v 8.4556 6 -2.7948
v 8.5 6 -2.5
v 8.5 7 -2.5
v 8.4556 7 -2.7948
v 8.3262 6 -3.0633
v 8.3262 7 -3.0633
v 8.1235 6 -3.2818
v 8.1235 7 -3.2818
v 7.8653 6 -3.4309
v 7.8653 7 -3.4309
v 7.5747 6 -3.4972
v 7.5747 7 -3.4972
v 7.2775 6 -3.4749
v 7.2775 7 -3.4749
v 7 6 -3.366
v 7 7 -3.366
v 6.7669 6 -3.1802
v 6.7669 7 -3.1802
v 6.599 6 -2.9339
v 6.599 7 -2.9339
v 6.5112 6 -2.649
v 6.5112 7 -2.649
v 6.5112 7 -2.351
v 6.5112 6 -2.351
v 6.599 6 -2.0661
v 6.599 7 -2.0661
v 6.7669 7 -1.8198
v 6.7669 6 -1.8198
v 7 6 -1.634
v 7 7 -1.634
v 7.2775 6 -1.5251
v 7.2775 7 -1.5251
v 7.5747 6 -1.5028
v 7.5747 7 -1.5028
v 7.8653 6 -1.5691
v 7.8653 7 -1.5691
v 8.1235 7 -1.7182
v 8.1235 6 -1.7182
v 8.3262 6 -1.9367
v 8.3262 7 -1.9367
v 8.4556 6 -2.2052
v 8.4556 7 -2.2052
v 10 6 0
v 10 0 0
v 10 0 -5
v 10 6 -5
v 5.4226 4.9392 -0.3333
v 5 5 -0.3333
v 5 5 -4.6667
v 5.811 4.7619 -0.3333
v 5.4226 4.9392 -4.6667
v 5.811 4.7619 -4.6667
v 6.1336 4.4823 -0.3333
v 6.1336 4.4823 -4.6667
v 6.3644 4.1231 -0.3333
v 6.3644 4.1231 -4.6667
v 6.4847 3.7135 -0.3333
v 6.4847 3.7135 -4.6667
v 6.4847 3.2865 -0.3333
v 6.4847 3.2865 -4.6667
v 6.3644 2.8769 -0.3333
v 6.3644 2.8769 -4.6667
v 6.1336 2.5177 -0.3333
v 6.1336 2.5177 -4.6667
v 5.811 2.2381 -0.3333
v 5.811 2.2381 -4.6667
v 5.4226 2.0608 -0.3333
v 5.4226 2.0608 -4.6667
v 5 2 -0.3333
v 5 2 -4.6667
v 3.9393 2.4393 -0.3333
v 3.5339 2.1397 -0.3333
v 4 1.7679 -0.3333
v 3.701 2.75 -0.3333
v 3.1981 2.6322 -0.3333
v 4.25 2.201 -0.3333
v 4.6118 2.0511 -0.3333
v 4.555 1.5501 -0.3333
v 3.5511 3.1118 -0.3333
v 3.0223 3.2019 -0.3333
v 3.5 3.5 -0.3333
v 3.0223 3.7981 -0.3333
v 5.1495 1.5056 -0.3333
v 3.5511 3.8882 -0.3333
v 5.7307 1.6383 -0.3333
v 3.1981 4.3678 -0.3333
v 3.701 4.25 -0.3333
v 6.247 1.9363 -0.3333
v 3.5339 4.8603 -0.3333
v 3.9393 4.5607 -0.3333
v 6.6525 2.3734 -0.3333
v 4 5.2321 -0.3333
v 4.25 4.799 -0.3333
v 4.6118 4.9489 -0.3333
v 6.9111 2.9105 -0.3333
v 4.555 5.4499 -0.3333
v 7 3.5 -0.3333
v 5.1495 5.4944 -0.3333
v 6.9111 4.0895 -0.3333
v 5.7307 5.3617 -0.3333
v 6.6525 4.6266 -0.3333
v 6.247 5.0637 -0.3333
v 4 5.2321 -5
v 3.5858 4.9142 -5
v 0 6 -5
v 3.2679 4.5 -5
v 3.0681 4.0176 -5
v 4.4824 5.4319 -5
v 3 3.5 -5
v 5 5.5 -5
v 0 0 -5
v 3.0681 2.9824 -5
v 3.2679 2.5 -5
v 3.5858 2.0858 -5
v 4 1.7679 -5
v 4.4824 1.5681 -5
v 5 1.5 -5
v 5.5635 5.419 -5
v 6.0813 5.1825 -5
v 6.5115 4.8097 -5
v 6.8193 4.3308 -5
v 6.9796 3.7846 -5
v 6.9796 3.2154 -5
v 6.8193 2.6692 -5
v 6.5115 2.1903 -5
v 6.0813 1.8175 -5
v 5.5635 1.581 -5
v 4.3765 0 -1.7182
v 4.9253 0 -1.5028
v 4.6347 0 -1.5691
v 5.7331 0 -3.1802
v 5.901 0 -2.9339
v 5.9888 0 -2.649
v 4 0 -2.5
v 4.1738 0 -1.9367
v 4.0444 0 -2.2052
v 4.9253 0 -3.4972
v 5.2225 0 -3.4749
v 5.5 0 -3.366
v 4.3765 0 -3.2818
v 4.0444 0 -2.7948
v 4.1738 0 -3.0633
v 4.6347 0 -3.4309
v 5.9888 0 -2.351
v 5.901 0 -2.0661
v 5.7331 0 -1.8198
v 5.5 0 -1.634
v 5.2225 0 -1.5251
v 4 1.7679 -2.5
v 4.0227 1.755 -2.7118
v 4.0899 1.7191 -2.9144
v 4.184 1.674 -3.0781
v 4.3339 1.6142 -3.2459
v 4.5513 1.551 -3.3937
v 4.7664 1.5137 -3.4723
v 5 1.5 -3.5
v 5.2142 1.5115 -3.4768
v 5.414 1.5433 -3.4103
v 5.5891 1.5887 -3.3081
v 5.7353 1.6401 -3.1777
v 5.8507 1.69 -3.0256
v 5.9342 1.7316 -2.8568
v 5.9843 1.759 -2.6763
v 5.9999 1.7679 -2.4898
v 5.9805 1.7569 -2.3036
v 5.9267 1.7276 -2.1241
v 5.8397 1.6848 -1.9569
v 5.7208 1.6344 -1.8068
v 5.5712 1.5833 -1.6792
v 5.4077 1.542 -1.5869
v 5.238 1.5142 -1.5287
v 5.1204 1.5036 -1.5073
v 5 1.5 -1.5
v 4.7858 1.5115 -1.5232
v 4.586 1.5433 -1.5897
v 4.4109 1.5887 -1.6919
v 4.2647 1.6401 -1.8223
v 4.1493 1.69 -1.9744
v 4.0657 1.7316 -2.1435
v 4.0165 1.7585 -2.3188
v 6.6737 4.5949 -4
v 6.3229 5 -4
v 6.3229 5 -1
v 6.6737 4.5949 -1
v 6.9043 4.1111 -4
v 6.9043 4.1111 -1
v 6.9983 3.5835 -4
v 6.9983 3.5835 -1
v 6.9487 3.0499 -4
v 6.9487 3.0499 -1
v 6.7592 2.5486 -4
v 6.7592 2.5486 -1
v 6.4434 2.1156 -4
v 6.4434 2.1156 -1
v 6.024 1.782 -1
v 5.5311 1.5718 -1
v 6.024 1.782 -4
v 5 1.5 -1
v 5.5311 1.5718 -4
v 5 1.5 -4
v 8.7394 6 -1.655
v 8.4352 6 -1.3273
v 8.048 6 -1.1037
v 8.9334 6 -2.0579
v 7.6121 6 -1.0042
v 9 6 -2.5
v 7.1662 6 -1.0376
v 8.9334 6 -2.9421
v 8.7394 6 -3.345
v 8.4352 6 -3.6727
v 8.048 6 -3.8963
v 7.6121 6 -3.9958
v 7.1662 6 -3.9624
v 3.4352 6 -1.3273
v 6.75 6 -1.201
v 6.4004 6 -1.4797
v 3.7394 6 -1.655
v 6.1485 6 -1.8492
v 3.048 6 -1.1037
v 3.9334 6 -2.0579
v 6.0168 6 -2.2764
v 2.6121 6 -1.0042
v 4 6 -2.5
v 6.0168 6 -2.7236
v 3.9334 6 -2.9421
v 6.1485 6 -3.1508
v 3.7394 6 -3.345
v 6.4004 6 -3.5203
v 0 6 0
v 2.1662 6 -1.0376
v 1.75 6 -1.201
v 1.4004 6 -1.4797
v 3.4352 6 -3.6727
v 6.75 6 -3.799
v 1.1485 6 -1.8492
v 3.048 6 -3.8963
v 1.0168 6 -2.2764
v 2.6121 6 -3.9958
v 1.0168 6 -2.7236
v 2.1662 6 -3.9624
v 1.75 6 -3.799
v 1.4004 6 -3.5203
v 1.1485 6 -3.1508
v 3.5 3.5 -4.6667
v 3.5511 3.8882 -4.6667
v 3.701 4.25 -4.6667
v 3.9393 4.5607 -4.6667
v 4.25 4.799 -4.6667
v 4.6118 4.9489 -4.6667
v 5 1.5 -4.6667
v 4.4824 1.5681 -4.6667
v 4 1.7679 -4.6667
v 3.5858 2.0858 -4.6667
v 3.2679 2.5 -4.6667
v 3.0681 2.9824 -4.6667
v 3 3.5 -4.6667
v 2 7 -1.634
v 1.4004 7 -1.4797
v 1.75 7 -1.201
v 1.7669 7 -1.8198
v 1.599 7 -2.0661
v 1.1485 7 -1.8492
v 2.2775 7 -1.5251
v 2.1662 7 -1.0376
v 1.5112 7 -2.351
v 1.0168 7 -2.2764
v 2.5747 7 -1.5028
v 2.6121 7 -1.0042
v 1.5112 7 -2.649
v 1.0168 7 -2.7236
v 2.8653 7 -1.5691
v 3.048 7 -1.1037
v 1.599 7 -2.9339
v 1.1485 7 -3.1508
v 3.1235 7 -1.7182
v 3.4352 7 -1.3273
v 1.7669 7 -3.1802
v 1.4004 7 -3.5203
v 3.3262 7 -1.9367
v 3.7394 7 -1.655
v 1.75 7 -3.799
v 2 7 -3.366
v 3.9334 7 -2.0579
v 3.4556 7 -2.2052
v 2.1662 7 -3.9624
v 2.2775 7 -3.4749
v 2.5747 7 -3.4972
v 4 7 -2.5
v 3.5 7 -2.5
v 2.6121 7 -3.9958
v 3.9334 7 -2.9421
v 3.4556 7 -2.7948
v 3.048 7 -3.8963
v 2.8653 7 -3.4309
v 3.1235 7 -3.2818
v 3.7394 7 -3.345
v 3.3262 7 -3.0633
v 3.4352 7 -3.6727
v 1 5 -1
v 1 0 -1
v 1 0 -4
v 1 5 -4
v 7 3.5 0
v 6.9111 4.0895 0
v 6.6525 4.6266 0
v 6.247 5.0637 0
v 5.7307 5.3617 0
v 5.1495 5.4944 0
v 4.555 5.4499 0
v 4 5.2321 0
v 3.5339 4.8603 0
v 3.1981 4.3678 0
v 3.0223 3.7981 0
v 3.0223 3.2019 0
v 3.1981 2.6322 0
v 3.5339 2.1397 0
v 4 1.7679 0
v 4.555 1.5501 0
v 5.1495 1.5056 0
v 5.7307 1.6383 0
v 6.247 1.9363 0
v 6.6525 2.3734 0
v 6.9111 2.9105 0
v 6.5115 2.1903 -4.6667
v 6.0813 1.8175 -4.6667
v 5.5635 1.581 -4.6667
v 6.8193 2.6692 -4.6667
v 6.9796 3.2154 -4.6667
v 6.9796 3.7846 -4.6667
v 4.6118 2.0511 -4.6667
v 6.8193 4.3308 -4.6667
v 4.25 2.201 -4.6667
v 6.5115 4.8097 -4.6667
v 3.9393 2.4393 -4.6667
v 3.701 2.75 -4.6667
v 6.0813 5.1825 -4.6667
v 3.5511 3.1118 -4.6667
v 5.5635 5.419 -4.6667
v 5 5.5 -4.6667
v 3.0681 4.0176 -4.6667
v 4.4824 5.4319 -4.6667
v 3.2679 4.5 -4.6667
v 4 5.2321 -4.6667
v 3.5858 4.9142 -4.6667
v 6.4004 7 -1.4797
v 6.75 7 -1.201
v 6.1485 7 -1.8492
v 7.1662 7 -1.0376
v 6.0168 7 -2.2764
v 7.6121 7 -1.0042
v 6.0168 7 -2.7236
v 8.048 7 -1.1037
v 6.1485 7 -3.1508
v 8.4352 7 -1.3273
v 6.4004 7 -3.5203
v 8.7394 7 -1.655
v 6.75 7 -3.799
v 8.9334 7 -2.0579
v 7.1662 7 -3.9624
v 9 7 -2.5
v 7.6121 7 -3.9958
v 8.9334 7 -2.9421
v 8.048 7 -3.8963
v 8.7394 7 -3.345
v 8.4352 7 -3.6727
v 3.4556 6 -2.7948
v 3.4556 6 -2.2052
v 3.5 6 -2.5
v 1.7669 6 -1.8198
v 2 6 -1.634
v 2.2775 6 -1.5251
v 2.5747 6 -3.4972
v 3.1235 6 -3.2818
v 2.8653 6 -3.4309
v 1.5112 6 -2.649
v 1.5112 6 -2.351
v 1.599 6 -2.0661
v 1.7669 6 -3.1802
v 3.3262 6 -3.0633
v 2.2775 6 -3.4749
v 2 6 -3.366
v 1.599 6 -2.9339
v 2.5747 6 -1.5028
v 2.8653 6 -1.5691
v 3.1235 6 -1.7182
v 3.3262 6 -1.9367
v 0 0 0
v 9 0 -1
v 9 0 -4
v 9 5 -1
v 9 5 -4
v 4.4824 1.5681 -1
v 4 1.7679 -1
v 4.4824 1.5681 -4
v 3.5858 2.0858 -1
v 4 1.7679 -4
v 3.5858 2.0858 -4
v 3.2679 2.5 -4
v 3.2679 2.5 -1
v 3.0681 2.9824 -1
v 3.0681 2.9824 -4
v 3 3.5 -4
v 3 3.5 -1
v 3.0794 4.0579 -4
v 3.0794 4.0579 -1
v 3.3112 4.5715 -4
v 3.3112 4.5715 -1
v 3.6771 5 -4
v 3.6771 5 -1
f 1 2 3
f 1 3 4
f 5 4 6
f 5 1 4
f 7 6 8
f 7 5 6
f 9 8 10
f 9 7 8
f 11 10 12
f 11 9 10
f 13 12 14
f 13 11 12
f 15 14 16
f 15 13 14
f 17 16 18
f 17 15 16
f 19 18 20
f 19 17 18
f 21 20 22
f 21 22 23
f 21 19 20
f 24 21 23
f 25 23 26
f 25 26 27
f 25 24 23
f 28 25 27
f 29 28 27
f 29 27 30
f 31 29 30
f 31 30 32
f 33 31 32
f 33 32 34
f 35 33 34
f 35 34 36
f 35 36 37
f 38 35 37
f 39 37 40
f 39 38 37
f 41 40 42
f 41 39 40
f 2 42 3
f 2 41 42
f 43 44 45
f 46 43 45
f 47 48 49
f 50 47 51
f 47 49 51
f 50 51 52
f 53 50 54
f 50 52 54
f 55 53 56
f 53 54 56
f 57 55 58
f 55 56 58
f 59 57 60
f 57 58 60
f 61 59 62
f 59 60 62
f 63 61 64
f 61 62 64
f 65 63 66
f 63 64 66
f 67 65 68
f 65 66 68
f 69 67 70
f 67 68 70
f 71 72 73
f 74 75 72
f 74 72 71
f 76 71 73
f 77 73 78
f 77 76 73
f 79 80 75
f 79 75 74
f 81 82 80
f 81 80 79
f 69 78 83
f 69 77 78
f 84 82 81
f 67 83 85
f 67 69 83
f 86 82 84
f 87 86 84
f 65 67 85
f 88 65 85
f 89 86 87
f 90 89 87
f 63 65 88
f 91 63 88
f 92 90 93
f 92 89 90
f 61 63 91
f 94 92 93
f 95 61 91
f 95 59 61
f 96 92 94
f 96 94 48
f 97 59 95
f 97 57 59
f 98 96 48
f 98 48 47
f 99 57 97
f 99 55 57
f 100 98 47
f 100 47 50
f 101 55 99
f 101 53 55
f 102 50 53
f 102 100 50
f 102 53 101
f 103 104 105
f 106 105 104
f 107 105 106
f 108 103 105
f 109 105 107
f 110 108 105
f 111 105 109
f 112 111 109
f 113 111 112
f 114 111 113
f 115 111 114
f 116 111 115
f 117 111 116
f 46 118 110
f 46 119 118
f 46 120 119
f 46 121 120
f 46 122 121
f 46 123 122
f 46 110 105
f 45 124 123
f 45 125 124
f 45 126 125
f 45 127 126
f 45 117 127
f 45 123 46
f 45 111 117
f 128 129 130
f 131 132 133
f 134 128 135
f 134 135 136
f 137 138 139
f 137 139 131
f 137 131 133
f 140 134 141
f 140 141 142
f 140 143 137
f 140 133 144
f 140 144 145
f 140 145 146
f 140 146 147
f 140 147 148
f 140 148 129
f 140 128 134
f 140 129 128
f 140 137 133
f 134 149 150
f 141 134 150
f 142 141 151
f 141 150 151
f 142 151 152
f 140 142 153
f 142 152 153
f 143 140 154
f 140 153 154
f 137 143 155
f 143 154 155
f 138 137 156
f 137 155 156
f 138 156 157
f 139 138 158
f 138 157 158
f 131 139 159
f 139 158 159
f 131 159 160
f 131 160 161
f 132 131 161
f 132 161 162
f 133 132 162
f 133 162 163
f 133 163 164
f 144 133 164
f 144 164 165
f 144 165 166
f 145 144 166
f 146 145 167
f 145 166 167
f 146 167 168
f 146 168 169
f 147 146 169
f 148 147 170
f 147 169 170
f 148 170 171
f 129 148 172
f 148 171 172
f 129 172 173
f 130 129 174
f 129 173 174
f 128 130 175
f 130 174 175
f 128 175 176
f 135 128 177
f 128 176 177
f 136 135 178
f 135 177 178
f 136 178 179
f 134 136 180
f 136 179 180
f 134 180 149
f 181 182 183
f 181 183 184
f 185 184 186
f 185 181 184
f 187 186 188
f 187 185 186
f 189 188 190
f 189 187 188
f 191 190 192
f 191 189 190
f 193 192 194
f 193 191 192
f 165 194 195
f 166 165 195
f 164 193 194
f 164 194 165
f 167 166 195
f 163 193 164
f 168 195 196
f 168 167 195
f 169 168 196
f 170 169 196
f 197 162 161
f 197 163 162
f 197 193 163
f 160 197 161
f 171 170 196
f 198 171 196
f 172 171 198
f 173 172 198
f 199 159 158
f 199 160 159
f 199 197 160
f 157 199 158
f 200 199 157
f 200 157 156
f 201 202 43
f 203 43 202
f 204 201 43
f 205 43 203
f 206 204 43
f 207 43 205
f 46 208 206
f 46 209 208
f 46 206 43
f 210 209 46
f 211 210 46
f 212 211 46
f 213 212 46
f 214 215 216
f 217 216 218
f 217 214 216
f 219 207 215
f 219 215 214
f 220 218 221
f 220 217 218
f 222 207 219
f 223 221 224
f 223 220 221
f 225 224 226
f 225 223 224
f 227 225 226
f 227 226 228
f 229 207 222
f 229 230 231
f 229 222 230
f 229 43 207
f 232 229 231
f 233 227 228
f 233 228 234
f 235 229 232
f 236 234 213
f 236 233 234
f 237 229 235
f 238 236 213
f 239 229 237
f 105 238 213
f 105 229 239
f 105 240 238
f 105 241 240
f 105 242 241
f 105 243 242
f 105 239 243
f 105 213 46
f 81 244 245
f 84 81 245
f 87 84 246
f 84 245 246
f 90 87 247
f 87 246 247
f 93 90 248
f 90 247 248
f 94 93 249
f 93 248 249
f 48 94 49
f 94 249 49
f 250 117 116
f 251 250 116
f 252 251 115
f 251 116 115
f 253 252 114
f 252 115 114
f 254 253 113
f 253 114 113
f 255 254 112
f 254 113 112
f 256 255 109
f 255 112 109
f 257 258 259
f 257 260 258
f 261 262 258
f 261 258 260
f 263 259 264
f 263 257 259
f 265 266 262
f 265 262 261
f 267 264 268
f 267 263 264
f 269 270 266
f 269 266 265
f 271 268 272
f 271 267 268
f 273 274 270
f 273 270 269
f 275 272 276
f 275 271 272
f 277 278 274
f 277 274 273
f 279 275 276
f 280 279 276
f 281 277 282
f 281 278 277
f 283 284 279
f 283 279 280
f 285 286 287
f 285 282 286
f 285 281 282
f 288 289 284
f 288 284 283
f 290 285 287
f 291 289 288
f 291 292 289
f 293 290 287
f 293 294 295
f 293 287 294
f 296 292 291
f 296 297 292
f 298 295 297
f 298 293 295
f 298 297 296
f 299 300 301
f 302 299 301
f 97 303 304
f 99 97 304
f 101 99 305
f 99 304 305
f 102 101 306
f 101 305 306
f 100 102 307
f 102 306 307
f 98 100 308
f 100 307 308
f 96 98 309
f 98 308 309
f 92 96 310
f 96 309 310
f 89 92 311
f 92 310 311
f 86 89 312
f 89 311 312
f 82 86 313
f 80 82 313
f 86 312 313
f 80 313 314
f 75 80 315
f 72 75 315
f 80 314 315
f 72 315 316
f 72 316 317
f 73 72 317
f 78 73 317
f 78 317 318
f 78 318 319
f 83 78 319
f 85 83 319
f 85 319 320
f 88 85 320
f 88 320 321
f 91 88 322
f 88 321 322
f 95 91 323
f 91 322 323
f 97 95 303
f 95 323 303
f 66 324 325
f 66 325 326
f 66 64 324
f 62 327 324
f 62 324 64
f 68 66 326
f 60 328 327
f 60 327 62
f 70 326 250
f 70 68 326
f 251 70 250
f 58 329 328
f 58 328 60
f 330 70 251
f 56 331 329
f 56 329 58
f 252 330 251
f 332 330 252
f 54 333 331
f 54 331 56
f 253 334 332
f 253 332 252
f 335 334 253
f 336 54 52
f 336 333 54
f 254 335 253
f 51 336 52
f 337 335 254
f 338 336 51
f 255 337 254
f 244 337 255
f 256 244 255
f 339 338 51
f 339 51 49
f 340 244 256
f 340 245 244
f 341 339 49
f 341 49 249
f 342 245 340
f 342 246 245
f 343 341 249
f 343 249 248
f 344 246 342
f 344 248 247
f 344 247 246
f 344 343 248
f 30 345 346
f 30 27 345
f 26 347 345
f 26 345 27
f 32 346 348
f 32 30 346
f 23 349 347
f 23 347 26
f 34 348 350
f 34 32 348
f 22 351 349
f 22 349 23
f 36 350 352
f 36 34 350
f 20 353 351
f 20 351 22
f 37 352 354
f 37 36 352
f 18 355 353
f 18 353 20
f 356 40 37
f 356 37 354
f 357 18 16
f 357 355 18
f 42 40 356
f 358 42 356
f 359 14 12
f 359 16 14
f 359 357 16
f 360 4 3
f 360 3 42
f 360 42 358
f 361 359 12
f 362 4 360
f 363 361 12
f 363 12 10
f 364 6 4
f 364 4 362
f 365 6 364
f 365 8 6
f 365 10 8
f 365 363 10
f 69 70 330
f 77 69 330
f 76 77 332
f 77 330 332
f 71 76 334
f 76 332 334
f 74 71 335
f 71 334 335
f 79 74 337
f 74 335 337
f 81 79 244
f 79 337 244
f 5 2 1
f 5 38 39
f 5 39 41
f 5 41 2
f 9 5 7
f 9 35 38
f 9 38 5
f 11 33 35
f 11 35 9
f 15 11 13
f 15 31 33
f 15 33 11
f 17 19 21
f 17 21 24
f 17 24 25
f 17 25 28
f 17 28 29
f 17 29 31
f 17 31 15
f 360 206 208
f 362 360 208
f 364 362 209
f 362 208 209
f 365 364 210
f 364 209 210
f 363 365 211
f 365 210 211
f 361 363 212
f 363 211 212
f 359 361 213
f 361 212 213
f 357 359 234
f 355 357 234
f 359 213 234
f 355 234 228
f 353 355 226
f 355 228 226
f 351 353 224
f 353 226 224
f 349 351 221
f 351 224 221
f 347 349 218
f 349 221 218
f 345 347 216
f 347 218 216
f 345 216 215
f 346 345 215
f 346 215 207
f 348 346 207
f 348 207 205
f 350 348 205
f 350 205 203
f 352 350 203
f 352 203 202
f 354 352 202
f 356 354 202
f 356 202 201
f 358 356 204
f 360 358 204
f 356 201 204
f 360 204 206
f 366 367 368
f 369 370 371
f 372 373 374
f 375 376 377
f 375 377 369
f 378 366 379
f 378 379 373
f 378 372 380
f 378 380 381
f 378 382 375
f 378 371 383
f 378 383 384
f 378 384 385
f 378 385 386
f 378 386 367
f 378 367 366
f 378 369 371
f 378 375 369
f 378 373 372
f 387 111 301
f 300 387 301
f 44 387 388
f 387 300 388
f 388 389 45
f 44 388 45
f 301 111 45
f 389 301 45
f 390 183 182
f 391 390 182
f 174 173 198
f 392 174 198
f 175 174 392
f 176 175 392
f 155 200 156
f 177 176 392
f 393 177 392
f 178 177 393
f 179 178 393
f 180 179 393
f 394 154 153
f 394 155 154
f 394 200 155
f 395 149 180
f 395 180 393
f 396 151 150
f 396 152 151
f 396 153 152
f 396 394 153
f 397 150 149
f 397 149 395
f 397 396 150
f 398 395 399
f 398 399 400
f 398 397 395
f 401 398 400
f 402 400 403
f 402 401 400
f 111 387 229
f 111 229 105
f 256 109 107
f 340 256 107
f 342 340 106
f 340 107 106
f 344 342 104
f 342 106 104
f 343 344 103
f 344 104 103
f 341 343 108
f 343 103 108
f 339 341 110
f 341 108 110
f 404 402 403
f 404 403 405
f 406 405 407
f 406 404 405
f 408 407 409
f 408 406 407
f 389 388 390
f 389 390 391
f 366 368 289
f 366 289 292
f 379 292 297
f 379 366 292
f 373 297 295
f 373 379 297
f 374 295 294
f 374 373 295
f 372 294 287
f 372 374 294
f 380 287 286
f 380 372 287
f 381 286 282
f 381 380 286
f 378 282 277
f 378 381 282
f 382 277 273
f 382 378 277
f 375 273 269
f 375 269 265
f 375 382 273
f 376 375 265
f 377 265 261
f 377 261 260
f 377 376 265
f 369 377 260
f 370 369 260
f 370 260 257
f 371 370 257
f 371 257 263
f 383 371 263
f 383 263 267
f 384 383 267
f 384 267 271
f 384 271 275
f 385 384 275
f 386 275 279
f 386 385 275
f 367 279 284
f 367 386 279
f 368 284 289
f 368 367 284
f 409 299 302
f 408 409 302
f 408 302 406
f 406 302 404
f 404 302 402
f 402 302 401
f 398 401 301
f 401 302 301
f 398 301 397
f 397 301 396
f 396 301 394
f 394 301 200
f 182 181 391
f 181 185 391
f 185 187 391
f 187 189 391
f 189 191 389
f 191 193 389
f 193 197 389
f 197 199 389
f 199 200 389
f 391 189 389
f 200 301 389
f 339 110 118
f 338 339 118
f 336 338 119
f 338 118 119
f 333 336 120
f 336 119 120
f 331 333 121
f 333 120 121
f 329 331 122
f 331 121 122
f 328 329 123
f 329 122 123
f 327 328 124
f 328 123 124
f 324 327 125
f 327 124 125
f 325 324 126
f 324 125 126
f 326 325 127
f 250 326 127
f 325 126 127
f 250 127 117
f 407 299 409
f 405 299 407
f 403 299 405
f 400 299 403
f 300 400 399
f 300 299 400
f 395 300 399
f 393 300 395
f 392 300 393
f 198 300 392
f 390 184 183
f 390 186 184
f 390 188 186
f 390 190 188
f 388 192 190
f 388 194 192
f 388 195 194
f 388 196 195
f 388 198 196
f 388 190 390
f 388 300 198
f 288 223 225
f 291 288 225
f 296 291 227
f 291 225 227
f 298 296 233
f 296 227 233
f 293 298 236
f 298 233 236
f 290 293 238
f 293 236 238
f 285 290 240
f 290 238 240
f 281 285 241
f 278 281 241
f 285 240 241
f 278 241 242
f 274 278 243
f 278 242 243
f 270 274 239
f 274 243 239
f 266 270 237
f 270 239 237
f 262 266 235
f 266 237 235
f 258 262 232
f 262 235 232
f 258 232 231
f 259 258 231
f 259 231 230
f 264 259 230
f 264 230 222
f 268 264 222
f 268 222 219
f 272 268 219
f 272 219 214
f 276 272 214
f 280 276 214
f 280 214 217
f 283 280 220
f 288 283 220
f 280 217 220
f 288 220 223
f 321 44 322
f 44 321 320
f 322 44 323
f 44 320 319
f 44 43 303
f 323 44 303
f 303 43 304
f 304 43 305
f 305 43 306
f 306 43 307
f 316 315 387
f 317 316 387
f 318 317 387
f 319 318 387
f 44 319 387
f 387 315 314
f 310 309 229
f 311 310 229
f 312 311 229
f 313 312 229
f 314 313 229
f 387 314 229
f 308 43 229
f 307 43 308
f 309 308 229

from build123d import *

# Parameters (mm, degrees)
SKETCH1_W           = 10
SKETCH1_H           = 5
SKETCH1_W_2         = 8
SKETCH1_H_2         = 3
BOSS_EXTRUDE1_DEPTH = 6
BOSS_EXTRUDE2_REACH = 11
SKETCH2_W           = 3
SKETCH2_H           = 1
SKETCH4_R           = 1.5
SKETCH4_R_2         = 1
BOSS_EXTRUDE3_DEPTH = 1
BOSS_EXTRUDE4_DEPTH = 5
BOSS_EXTRUDE5_DEPTH = 5
CUT_EXTRUDE2_DEPTH  = 5
CUT_EXTRUDE3_DEPTH  = 0.333333333
SKETCH8_R           = 2
CUT_EXTRUDE4_DEPTH  = 0.333333333


with BuildPart() as part:
    # Sketch1 → Boss-Extrude1 (new body)
    with BuildSketch(Plane(origin=(0, 0, 0), x_dir=(1, 0, 0), z_dir=(0, 1, 0))):
        with Locations((5, 2.5)):
            Rectangle(SKETCH1_W, SKETCH1_H)
        with Locations((5, 2.5)):
            Rectangle(SKETCH1_W_2, SKETCH1_H_2, mode=Mode.SUBTRACT)
    extrude(amount=BOSS_EXTRUDE1_DEPTH)

    # Sketch2 → Boss-Extrude2 (add, up to next)
    with BuildSketch(Plane(origin=(1, 0, 0), x_dir=(0, 0, -1), z_dir=(1, 0, 0)), mode=Mode.PRIVATE) as boss_extrude2_sk1:
        with Locations((2.5, 5.5)):
            Rectangle(SKETCH2_W, SKETCH2_H)
    boss_extrude2_tool1 = extrude(boss_extrude2_sk1.sketch, amount=BOSS_EXTRUDE2_REACH, mode=Mode.PRIVATE) - part.part
    add(boss_extrude2_tool1.solids().sort_by_distance((1, 5.5, -2.5))[0])

    # Sketch4 → Boss-Extrude3 (add)
    with BuildSketch(Plane(origin=(0, 6, 0), x_dir=(1, 0, 0), z_dir=(0, 1, 0))):
        with Locations((2.5, 2.5)):
            Circle(SKETCH4_R)
        with Locations((2.5, 2.5)):
            Circle(SKETCH4_R_2, mode=Mode.SUBTRACT)
        with Locations((7.5, 2.5)):
            Circle(SKETCH4_R)
        with Locations((7.5, 2.5)):
            Circle(SKETCH4_R_2, mode=Mode.SUBTRACT)
    extrude(amount=BOSS_EXTRUDE3_DEPTH)

    # Sketch6 → Boss-Extrude4 (add)
    with BuildSketch(Plane(origin=(0, 5, 0), x_dir=(-1, 0, 0), z_dir=(0, -1, 0))):
        with BuildLine():
            ThreePointArc((-6, 2.5), (-5, 1.5), (-4, 2.5))
            Line((-4, 2.5), (-6, 2.5))
        make_face()
        with BuildLine():
            Line((-6, 2.5), (-4, 2.5))
            ThreePointArc((-4, 2.5), (-5, 3.5), (-6, 2.5))
        make_face()
    extrude(amount=BOSS_EXTRUDE4_DEPTH)

    # Sketch7 → Boss-Extrude5 (add)
    with BuildSketch(Plane(origin=(0, 0, -5), x_dir=(-1, 0, 0), z_dir=(0, 0, -1))):
        with BuildLine():
            ThreePointArc((-5, 5.5), (-7, 3.5), (-5, 1.5))
            Line((-5, 1.5), (-5, 2))
            ThreePointArc((-5, 2), (-6.5, 3.5), (-5, 5))
            Line((-5, 5), (-5, 5.5))
        make_face()
        with BuildLine():
            Line((-5, 2), (-5, 1.5))
            ThreePointArc((-5, 1.5), (-3.585786438, 2.085786438), (-3, 3.5))
            ThreePointArc((-3, 3.5), (-3.585786438, 4.914213562), (-5, 5.5))
            Line((-5, 5.5), (-5, 5))
            ThreePointArc((-5, 5), (-3.939339828, 4.560660172), (-3.5, 3.5))
            ThreePointArc((-3.5, 3.5), (-3.939339828, 2.439339828), (-5, 2))
        make_face()
        with BuildLine():
            ThreePointArc((-5, 5), (-6.5, 3.5), (-5, 2))
            Line((-5, 2), (-5, 5))
        make_face()
        with BuildLine():
            Line((-5, 5), (-5, 2))
            ThreePointArc((-5, 2), (-3.939339828, 2.439339828), (-3.5, 3.5))
            ThreePointArc((-3.5, 3.5), (-3.939339828, 4.560660172), (-5, 5))
        make_face()
    extrude(amount=-BOSS_EXTRUDE5_DEPTH)

    # Sketch7<3> → Cut-Extrude2 (cut)
    with BuildSketch(Plane(origin=(0, 0, -5), x_dir=(-1, 0, 0), z_dir=(0, 0, -1))):
        with BuildLine():
            ThreePointArc((-5, 5), (-6.5, 3.5), (-5, 2))
            Line((-5, 2), (-5, 5))
        make_face()
        with BuildLine():
            Line((-5, 5), (-5, 2))
            ThreePointArc((-5, 2), (-3.939339828, 2.439339828), (-3.5, 3.5))
            ThreePointArc((-3.5, 3.5), (-3.939339828, 4.560660172), (-5, 5))
        make_face()
    extrude(amount=-CUT_EXTRUDE2_DEPTH, mode=Mode.SUBTRACT)

    # Sketch7<4> → Cut-Extrude3 (cut)
    with BuildSketch(Plane(origin=(0, 0, -5), x_dir=(-1, 0, 0), z_dir=(0, 0, -1))):
        with BuildLine():
            ThreePointArc((-5, 5.5), (-7, 3.5), (-5, 1.5))
            Line((-5, 1.5), (-5, 2))
            ThreePointArc((-5, 2), (-6.5, 3.5), (-5, 5))
            Line((-5, 5), (-5, 5.5))
        make_face()
        with BuildLine():
            Line((-5, 2), (-5, 1.5))
            ThreePointArc((-5, 1.5), (-3.585786438, 2.085786438), (-3, 3.5))
            ThreePointArc((-3, 3.5), (-3.585786438, 4.914213562), (-5, 5.5))
            Line((-5, 5.5), (-5, 5))
            ThreePointArc((-5, 5), (-3.939339828, 4.560660172), (-3.5, 3.5))
            ThreePointArc((-3.5, 3.5), (-3.939339828, 2.439339828), (-5, 2))
        make_face()
    extrude(amount=-CUT_EXTRUDE3_DEPTH, mode=Mode.SUBTRACT)

    # Sketch8 → Cut-Extrude4 (cut)
    with BuildSketch(Plane.XY):
        with Locations((5, 3.5)):
            Circle(SKETCH8_R)
    extrude(amount=-CUT_EXTRUDE4_DEPTH, mode=Mode.SUBTRACT)


solid = part.part
